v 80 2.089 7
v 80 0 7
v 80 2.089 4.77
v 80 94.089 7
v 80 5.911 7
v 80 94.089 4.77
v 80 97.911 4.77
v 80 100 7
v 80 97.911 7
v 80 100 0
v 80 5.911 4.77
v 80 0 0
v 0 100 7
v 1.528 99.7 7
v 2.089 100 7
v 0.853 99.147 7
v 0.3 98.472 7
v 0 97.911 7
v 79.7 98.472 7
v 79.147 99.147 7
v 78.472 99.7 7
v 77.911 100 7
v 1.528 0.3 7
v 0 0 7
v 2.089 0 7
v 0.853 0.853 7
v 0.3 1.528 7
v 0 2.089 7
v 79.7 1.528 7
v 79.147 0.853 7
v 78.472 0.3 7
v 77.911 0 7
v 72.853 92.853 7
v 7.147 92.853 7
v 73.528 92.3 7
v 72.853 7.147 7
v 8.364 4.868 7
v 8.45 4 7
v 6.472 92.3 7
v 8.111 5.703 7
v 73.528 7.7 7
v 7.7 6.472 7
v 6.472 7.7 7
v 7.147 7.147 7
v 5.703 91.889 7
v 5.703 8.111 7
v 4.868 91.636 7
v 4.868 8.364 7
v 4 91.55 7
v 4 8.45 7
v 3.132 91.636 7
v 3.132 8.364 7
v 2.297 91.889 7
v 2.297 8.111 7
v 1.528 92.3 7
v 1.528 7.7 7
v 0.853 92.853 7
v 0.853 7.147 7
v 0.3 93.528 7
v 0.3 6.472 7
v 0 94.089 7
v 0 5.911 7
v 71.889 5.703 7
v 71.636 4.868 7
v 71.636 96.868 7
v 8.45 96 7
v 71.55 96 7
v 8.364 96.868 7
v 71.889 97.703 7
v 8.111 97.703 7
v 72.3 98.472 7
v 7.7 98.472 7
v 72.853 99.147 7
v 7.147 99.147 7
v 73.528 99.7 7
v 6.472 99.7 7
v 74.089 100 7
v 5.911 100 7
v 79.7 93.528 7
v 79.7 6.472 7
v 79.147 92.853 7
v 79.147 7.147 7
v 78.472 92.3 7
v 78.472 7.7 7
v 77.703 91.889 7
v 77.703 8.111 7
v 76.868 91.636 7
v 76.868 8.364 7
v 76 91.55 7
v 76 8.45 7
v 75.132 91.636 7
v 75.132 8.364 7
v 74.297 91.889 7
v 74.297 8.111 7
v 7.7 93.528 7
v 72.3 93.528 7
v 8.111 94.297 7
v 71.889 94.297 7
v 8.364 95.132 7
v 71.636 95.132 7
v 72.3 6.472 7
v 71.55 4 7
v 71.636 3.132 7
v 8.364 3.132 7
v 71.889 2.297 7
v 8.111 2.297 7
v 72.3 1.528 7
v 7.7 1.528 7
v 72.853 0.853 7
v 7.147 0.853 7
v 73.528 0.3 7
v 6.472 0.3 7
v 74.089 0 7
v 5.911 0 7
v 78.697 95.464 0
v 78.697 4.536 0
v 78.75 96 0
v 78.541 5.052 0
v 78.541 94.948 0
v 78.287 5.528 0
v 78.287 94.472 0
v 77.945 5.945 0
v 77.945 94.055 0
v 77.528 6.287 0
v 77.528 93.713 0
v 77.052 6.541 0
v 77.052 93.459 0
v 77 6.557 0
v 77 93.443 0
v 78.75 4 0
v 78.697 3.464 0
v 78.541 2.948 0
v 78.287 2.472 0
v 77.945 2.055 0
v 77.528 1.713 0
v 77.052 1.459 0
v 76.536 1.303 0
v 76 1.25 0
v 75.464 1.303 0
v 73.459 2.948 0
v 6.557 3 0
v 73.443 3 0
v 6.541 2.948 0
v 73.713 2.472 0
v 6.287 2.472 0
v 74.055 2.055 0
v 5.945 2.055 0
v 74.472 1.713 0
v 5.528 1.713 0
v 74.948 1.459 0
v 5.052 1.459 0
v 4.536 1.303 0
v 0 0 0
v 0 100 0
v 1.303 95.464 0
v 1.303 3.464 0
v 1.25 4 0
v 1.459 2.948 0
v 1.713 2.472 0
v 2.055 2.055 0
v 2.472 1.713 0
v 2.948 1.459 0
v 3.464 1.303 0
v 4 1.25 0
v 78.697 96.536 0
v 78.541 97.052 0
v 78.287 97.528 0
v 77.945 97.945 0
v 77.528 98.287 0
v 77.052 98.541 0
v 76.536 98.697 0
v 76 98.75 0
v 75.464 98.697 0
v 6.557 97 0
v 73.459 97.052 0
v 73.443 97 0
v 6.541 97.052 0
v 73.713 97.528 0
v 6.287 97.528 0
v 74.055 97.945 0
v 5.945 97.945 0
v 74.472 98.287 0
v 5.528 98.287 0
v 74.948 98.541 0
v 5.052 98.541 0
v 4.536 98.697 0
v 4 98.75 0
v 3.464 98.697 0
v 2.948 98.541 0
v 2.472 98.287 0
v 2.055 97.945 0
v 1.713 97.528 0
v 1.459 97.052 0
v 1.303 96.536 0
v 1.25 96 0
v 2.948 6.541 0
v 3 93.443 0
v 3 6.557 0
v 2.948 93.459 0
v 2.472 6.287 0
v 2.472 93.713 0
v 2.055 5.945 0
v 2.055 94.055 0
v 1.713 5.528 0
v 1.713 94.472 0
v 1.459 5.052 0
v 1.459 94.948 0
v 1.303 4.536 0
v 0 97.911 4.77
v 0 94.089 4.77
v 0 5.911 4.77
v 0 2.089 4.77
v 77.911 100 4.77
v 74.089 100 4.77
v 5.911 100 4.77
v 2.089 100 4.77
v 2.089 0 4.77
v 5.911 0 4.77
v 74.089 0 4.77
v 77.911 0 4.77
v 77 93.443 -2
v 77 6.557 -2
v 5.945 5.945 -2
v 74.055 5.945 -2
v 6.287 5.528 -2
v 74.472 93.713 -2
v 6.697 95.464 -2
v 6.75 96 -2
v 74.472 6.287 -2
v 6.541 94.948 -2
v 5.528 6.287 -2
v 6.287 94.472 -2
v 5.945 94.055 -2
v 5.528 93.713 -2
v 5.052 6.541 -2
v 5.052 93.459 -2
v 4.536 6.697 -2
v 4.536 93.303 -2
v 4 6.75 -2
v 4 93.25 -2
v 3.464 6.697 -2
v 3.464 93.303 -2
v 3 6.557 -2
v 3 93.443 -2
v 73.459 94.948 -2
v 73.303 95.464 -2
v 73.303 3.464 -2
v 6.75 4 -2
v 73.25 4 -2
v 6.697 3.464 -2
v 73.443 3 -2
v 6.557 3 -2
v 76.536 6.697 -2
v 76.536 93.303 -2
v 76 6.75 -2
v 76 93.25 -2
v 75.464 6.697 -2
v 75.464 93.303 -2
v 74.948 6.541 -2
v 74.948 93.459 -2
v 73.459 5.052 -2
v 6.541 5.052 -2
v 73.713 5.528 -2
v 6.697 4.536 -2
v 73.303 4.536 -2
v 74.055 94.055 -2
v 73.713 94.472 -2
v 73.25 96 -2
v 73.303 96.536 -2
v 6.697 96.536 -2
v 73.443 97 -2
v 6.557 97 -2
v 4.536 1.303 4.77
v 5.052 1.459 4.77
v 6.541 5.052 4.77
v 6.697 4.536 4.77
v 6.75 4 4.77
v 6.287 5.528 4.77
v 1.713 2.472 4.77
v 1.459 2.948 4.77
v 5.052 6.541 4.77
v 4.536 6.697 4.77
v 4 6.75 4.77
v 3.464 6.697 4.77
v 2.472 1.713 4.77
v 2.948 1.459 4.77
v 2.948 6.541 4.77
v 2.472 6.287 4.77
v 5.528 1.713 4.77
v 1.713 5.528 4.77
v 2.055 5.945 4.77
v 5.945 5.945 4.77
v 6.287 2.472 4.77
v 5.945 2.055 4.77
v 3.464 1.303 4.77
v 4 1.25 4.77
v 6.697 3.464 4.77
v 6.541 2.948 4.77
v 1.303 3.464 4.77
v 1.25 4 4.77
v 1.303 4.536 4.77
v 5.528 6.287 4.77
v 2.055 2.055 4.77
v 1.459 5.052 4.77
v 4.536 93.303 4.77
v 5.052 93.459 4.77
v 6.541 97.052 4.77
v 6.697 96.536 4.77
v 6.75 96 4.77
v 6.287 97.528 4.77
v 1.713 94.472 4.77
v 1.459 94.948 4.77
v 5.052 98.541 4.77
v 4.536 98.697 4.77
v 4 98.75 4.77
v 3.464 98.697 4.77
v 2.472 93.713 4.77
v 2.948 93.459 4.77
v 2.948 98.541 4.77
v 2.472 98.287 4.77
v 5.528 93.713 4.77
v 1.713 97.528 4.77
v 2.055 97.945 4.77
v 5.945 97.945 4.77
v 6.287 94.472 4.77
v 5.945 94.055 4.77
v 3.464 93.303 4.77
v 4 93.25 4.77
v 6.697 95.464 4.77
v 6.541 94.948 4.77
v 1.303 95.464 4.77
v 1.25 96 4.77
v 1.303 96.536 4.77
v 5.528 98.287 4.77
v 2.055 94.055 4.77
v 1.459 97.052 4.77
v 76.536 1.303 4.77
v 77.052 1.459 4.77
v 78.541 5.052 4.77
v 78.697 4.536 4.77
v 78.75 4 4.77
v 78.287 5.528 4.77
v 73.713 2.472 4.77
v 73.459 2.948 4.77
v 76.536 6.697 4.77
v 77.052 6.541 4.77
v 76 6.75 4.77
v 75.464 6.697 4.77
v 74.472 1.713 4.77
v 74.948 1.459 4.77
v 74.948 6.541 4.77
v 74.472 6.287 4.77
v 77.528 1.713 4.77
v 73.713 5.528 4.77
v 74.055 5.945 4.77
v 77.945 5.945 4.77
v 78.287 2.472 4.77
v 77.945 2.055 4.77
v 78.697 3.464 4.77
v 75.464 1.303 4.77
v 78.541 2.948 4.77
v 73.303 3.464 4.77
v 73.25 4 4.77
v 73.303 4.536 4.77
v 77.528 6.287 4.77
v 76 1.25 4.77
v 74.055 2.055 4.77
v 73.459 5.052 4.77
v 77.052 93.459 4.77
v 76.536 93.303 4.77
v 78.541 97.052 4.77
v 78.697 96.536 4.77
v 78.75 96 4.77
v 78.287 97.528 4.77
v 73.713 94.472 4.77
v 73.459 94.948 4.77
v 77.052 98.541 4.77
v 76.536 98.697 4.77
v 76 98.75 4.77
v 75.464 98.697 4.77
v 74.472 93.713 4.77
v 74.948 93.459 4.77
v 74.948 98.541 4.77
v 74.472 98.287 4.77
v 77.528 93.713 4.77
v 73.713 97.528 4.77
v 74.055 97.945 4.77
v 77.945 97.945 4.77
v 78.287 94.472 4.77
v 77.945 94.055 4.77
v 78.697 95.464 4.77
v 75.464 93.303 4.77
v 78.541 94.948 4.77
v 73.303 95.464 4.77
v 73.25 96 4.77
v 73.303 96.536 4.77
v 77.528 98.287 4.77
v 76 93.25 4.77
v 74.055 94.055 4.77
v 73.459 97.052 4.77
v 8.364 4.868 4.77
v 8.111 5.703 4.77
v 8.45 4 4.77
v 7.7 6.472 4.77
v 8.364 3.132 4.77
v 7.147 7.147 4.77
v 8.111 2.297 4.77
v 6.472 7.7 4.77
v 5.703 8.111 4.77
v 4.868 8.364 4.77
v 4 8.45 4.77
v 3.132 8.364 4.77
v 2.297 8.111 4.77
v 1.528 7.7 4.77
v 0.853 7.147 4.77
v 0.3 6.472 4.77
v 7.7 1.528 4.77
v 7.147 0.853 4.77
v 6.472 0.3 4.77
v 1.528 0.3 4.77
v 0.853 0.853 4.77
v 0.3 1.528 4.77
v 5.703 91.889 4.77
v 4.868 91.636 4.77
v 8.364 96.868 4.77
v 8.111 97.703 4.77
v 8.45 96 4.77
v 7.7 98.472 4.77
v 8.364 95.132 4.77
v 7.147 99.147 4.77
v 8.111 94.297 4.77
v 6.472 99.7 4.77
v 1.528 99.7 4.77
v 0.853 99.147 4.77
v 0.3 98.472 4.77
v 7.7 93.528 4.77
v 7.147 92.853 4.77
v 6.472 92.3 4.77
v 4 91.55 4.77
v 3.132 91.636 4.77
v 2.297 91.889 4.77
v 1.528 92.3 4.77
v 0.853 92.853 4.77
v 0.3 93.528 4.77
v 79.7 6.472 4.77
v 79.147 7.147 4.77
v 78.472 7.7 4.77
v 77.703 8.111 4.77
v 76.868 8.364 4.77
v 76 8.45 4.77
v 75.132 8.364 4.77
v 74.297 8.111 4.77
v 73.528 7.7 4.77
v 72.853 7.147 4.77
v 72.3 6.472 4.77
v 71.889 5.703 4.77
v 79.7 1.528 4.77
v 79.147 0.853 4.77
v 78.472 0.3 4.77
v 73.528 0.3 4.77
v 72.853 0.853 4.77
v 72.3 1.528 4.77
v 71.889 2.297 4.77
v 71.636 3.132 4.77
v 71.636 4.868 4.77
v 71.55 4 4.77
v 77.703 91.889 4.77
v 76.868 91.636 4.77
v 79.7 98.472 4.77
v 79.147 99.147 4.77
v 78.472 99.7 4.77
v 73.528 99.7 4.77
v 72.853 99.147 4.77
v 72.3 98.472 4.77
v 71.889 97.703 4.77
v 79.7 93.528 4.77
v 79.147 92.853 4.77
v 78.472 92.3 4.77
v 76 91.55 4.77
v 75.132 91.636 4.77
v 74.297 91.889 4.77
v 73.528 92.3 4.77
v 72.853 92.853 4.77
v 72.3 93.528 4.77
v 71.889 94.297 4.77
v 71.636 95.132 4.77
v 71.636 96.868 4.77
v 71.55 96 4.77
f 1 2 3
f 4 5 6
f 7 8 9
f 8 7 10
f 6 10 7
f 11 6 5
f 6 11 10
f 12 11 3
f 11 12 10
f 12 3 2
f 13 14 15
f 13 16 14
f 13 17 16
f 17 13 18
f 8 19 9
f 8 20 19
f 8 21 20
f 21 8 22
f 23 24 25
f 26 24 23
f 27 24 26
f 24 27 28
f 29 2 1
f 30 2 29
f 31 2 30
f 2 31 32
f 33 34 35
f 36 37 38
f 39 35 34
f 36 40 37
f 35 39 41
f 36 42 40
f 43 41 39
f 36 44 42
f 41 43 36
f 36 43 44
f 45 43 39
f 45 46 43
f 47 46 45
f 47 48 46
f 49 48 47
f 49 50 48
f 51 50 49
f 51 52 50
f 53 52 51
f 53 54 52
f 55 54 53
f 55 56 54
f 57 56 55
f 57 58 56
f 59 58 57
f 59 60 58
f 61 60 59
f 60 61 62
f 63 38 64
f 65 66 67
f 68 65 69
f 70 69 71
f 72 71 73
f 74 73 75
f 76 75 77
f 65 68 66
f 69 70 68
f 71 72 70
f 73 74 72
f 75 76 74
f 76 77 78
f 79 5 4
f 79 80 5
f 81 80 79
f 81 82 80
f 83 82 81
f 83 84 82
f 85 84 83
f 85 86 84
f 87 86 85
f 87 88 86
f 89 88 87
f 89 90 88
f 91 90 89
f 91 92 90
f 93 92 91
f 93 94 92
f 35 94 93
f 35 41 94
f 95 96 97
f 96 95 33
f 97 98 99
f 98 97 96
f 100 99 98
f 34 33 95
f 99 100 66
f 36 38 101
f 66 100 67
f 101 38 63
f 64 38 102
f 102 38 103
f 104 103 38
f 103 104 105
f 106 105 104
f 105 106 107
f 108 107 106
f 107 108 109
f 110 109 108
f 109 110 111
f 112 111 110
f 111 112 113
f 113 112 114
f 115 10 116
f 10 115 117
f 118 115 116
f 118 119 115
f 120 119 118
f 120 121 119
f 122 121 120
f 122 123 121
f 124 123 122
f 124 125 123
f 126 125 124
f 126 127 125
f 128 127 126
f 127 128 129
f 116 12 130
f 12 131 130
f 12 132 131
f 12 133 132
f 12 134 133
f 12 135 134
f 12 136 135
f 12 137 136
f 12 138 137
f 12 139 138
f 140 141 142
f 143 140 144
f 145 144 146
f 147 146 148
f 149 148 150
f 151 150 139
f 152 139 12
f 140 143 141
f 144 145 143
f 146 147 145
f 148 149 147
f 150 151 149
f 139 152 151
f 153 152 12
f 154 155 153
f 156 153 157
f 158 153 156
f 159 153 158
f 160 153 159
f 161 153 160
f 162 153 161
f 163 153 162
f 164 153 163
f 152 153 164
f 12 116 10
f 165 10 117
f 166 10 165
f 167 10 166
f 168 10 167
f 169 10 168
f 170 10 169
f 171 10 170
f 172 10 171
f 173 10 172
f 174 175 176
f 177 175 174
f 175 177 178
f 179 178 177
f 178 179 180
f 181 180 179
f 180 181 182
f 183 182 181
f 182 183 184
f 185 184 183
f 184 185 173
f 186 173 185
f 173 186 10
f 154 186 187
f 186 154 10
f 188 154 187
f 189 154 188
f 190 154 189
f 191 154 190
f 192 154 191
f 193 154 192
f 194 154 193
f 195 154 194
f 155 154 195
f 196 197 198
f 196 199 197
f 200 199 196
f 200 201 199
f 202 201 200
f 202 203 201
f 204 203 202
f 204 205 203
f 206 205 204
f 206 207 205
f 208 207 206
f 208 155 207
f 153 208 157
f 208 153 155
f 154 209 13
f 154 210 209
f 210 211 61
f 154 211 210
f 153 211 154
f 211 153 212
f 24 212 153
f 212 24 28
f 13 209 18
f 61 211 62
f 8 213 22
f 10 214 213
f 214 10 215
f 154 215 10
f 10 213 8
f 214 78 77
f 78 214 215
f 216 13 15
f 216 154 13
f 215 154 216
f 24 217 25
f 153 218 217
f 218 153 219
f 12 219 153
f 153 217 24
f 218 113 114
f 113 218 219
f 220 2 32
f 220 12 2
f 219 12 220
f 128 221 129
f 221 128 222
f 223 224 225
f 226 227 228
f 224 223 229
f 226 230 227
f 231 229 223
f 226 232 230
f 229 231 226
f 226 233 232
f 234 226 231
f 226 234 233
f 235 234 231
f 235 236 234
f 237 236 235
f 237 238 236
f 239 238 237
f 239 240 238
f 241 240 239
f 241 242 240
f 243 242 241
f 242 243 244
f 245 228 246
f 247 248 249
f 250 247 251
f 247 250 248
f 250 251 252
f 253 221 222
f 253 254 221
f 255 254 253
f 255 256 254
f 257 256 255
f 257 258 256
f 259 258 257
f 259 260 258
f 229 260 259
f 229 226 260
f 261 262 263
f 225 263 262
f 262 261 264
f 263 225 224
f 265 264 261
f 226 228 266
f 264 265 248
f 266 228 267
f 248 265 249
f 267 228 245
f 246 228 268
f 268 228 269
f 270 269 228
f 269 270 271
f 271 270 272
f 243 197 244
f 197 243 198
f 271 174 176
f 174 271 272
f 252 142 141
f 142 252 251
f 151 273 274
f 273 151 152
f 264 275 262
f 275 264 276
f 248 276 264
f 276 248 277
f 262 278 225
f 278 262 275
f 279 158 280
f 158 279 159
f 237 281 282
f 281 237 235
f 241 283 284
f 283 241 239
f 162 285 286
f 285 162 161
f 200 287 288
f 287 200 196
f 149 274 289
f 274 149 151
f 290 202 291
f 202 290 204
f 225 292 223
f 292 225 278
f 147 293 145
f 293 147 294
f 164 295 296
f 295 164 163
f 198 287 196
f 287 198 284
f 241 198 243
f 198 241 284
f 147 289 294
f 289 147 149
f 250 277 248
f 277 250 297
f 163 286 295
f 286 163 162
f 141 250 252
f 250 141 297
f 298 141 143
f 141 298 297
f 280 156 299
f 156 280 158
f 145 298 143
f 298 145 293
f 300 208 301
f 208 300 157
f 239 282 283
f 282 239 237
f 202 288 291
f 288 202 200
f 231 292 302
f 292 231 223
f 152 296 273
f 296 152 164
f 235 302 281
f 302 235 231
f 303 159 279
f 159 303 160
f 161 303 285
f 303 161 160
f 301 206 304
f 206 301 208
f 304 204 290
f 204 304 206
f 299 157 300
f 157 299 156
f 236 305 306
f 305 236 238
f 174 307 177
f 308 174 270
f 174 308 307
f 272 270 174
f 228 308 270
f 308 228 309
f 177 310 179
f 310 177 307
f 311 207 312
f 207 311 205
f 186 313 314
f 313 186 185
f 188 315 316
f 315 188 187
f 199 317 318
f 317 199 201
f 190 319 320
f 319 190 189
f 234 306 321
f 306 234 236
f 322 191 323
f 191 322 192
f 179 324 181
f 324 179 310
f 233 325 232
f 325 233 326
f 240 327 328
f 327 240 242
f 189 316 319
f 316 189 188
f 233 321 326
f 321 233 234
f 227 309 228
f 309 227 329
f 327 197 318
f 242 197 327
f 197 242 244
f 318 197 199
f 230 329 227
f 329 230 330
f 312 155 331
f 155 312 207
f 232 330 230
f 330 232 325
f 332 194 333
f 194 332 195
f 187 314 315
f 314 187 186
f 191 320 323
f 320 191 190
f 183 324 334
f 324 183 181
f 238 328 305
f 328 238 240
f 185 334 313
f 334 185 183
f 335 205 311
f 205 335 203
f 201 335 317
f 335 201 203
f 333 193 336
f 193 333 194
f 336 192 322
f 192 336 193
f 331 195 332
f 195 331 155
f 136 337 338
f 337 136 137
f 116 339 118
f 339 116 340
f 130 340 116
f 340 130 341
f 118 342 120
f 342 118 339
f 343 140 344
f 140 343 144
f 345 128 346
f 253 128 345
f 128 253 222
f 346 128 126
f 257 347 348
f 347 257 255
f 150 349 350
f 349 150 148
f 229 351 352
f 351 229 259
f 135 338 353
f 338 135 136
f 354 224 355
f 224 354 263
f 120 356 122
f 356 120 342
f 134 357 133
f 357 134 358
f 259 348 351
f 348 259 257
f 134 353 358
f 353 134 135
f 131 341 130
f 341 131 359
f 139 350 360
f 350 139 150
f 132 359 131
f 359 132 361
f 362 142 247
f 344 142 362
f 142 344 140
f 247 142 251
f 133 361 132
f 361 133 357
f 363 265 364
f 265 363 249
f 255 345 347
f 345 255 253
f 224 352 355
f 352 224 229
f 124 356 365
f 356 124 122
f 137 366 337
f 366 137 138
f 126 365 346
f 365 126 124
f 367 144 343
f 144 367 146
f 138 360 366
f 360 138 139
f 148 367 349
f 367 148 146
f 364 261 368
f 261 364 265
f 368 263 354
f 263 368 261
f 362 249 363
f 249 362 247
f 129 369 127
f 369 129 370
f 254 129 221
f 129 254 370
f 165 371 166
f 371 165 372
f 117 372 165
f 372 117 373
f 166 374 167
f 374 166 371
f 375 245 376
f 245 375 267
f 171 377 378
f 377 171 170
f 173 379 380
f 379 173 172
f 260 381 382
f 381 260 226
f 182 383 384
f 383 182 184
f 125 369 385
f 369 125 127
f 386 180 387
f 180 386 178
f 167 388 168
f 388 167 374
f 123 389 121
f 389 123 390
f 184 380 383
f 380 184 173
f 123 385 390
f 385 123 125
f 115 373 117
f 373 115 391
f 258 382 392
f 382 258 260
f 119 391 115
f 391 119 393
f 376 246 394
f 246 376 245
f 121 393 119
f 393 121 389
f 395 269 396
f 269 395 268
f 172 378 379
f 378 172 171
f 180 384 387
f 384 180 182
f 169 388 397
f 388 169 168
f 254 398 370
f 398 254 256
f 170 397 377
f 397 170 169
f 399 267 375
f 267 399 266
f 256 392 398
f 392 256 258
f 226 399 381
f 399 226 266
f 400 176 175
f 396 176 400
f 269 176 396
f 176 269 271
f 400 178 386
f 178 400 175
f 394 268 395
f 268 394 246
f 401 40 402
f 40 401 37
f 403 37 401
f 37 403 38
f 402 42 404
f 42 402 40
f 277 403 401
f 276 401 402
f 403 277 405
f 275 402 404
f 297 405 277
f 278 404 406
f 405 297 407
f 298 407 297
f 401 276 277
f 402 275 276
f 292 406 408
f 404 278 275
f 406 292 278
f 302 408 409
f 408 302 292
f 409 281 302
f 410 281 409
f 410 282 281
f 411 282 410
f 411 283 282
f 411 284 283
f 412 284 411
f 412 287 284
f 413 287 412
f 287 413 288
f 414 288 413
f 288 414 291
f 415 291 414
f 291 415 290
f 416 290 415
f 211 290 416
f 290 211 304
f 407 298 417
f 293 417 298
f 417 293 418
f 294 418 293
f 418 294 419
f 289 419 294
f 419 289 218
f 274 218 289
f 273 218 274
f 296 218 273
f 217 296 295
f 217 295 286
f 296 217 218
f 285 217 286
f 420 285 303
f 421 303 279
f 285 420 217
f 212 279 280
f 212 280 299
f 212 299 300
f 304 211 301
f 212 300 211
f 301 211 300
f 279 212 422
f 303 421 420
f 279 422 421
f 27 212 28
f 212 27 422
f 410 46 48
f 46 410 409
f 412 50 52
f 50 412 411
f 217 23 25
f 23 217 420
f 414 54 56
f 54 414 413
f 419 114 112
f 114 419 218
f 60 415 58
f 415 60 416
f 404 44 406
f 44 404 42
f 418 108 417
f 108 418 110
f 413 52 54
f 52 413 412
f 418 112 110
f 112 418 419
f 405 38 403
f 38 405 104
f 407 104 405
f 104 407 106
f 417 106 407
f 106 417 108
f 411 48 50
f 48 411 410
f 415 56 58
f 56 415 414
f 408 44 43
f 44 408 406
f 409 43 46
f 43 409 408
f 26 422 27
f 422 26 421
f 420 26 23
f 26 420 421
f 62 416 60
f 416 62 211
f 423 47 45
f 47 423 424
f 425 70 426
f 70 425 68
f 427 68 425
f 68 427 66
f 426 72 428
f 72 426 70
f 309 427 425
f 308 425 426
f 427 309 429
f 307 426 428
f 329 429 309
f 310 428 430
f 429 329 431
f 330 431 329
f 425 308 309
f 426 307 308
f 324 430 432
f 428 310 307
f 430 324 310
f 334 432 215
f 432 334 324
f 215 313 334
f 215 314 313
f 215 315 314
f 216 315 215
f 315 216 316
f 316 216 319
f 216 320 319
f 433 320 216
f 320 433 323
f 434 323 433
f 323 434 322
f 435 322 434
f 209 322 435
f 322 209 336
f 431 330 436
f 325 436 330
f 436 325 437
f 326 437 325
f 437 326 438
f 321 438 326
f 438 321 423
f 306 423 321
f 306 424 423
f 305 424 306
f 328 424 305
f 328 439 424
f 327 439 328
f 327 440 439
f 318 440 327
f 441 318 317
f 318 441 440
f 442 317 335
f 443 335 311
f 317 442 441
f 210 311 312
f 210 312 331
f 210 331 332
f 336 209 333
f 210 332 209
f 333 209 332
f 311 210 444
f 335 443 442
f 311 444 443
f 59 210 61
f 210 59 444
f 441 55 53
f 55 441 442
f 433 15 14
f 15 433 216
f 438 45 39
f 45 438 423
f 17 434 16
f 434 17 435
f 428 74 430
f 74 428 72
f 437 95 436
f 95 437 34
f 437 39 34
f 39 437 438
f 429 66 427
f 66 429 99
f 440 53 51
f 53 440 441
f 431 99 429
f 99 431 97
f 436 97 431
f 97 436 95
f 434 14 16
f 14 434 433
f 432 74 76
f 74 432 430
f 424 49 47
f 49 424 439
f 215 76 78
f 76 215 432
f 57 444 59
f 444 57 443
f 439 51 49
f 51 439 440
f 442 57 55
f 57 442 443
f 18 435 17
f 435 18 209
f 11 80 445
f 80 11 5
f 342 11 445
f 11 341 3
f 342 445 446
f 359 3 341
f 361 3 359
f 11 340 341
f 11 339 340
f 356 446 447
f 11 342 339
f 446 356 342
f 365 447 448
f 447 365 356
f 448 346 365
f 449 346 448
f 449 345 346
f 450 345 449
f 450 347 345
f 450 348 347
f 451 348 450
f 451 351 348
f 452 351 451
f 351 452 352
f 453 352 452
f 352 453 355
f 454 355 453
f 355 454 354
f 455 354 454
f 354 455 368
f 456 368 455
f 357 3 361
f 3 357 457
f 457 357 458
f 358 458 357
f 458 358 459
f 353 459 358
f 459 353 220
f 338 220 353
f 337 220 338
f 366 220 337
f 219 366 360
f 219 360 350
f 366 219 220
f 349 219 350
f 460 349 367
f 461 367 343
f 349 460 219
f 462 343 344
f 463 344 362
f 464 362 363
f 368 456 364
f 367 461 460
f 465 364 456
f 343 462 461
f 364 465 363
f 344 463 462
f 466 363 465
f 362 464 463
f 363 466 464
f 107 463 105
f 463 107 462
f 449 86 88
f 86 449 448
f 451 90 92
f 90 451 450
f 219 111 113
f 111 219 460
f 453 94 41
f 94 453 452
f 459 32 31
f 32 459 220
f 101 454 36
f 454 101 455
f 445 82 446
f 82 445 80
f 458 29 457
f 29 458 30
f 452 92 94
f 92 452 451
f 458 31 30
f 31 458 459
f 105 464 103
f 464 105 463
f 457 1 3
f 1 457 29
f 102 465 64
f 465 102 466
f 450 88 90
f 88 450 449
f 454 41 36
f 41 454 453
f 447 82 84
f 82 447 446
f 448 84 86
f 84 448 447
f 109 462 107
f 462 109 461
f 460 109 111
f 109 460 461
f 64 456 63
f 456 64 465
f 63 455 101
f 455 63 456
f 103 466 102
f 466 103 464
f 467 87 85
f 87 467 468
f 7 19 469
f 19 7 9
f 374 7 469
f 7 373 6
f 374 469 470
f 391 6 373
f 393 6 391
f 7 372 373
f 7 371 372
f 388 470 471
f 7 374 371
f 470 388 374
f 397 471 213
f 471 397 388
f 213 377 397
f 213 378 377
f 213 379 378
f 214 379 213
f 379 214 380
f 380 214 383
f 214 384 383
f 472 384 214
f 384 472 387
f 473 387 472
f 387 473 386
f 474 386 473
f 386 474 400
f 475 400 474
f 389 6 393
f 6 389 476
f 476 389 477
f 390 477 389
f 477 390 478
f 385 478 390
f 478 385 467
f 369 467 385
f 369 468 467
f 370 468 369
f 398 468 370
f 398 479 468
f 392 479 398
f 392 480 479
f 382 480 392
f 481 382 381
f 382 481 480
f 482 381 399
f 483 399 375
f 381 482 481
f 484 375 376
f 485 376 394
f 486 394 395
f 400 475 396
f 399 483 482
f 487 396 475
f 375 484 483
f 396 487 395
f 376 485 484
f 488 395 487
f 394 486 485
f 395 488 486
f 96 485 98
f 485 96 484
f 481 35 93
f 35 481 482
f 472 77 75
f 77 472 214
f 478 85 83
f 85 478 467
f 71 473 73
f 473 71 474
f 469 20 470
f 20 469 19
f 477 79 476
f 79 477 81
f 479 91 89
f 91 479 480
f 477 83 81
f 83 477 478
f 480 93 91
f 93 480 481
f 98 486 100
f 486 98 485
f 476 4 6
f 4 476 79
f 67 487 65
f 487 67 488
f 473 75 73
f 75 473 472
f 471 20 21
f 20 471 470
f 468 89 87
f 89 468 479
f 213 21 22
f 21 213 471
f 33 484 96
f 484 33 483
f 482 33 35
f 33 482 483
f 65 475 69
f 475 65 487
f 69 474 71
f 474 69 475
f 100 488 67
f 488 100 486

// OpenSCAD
$fn = 32;

// ----------------------------------------------------------------------
// Enclosure lid: 80 x 100 x 7 mm, 4 bolt holes
// ----------------------------------------------------------------------

// --- parameters (mm) ---
length = 80;              // lid length, X
width = 100;              // lid width, Y
plate_t = 7;              // lid plate thickness
bolt_d = 5.5;             // bolt clearance
boss_lip = 4;             // bolt hole inset from the corner
sink = 1;                 // overlap of the lip and ribs into the plate
lip_h = 3;                // lip height below the plate
lip_wall = 3;             // lip wall thickness
cs_d = 8.9;               // countersink diameter
cs_h = 2.23;              // countersink depth

module plate() {
  cube([length, width, plate_t]);
  /* lip that drops into the housing opening, sunk into the plate */
  translate([lip_wall, lip_wall, -lip_h + sink]) cube([length - 2 * lip_wall, width - 2 * lip_wall, lip_h]);
}

difference() {
  plate();
  /* bolt pattern matching the corner bosses */
  for (sx = [0, 1]) for (sy = [0, 1])
    translate([sx * (length - 2 * boss_lip) + boss_lip, sy * (width - 2 * boss_lip) + boss_lip, -lip_h - 1])
      cylinder(h = plate_t + lip_h + 2, d = bolt_d);
  /* countersinks so the heads sit flush */
  for (sx = [0, 1]) for (sy = [0, 1])
    translate([sx * (length - 2 * boss_lip) + boss_lip, sy * (width - 2 * boss_lip) + boss_lip, plate_t - cs_h])
      cylinder(h = cs_h + 0.5, d = cs_d);
}
